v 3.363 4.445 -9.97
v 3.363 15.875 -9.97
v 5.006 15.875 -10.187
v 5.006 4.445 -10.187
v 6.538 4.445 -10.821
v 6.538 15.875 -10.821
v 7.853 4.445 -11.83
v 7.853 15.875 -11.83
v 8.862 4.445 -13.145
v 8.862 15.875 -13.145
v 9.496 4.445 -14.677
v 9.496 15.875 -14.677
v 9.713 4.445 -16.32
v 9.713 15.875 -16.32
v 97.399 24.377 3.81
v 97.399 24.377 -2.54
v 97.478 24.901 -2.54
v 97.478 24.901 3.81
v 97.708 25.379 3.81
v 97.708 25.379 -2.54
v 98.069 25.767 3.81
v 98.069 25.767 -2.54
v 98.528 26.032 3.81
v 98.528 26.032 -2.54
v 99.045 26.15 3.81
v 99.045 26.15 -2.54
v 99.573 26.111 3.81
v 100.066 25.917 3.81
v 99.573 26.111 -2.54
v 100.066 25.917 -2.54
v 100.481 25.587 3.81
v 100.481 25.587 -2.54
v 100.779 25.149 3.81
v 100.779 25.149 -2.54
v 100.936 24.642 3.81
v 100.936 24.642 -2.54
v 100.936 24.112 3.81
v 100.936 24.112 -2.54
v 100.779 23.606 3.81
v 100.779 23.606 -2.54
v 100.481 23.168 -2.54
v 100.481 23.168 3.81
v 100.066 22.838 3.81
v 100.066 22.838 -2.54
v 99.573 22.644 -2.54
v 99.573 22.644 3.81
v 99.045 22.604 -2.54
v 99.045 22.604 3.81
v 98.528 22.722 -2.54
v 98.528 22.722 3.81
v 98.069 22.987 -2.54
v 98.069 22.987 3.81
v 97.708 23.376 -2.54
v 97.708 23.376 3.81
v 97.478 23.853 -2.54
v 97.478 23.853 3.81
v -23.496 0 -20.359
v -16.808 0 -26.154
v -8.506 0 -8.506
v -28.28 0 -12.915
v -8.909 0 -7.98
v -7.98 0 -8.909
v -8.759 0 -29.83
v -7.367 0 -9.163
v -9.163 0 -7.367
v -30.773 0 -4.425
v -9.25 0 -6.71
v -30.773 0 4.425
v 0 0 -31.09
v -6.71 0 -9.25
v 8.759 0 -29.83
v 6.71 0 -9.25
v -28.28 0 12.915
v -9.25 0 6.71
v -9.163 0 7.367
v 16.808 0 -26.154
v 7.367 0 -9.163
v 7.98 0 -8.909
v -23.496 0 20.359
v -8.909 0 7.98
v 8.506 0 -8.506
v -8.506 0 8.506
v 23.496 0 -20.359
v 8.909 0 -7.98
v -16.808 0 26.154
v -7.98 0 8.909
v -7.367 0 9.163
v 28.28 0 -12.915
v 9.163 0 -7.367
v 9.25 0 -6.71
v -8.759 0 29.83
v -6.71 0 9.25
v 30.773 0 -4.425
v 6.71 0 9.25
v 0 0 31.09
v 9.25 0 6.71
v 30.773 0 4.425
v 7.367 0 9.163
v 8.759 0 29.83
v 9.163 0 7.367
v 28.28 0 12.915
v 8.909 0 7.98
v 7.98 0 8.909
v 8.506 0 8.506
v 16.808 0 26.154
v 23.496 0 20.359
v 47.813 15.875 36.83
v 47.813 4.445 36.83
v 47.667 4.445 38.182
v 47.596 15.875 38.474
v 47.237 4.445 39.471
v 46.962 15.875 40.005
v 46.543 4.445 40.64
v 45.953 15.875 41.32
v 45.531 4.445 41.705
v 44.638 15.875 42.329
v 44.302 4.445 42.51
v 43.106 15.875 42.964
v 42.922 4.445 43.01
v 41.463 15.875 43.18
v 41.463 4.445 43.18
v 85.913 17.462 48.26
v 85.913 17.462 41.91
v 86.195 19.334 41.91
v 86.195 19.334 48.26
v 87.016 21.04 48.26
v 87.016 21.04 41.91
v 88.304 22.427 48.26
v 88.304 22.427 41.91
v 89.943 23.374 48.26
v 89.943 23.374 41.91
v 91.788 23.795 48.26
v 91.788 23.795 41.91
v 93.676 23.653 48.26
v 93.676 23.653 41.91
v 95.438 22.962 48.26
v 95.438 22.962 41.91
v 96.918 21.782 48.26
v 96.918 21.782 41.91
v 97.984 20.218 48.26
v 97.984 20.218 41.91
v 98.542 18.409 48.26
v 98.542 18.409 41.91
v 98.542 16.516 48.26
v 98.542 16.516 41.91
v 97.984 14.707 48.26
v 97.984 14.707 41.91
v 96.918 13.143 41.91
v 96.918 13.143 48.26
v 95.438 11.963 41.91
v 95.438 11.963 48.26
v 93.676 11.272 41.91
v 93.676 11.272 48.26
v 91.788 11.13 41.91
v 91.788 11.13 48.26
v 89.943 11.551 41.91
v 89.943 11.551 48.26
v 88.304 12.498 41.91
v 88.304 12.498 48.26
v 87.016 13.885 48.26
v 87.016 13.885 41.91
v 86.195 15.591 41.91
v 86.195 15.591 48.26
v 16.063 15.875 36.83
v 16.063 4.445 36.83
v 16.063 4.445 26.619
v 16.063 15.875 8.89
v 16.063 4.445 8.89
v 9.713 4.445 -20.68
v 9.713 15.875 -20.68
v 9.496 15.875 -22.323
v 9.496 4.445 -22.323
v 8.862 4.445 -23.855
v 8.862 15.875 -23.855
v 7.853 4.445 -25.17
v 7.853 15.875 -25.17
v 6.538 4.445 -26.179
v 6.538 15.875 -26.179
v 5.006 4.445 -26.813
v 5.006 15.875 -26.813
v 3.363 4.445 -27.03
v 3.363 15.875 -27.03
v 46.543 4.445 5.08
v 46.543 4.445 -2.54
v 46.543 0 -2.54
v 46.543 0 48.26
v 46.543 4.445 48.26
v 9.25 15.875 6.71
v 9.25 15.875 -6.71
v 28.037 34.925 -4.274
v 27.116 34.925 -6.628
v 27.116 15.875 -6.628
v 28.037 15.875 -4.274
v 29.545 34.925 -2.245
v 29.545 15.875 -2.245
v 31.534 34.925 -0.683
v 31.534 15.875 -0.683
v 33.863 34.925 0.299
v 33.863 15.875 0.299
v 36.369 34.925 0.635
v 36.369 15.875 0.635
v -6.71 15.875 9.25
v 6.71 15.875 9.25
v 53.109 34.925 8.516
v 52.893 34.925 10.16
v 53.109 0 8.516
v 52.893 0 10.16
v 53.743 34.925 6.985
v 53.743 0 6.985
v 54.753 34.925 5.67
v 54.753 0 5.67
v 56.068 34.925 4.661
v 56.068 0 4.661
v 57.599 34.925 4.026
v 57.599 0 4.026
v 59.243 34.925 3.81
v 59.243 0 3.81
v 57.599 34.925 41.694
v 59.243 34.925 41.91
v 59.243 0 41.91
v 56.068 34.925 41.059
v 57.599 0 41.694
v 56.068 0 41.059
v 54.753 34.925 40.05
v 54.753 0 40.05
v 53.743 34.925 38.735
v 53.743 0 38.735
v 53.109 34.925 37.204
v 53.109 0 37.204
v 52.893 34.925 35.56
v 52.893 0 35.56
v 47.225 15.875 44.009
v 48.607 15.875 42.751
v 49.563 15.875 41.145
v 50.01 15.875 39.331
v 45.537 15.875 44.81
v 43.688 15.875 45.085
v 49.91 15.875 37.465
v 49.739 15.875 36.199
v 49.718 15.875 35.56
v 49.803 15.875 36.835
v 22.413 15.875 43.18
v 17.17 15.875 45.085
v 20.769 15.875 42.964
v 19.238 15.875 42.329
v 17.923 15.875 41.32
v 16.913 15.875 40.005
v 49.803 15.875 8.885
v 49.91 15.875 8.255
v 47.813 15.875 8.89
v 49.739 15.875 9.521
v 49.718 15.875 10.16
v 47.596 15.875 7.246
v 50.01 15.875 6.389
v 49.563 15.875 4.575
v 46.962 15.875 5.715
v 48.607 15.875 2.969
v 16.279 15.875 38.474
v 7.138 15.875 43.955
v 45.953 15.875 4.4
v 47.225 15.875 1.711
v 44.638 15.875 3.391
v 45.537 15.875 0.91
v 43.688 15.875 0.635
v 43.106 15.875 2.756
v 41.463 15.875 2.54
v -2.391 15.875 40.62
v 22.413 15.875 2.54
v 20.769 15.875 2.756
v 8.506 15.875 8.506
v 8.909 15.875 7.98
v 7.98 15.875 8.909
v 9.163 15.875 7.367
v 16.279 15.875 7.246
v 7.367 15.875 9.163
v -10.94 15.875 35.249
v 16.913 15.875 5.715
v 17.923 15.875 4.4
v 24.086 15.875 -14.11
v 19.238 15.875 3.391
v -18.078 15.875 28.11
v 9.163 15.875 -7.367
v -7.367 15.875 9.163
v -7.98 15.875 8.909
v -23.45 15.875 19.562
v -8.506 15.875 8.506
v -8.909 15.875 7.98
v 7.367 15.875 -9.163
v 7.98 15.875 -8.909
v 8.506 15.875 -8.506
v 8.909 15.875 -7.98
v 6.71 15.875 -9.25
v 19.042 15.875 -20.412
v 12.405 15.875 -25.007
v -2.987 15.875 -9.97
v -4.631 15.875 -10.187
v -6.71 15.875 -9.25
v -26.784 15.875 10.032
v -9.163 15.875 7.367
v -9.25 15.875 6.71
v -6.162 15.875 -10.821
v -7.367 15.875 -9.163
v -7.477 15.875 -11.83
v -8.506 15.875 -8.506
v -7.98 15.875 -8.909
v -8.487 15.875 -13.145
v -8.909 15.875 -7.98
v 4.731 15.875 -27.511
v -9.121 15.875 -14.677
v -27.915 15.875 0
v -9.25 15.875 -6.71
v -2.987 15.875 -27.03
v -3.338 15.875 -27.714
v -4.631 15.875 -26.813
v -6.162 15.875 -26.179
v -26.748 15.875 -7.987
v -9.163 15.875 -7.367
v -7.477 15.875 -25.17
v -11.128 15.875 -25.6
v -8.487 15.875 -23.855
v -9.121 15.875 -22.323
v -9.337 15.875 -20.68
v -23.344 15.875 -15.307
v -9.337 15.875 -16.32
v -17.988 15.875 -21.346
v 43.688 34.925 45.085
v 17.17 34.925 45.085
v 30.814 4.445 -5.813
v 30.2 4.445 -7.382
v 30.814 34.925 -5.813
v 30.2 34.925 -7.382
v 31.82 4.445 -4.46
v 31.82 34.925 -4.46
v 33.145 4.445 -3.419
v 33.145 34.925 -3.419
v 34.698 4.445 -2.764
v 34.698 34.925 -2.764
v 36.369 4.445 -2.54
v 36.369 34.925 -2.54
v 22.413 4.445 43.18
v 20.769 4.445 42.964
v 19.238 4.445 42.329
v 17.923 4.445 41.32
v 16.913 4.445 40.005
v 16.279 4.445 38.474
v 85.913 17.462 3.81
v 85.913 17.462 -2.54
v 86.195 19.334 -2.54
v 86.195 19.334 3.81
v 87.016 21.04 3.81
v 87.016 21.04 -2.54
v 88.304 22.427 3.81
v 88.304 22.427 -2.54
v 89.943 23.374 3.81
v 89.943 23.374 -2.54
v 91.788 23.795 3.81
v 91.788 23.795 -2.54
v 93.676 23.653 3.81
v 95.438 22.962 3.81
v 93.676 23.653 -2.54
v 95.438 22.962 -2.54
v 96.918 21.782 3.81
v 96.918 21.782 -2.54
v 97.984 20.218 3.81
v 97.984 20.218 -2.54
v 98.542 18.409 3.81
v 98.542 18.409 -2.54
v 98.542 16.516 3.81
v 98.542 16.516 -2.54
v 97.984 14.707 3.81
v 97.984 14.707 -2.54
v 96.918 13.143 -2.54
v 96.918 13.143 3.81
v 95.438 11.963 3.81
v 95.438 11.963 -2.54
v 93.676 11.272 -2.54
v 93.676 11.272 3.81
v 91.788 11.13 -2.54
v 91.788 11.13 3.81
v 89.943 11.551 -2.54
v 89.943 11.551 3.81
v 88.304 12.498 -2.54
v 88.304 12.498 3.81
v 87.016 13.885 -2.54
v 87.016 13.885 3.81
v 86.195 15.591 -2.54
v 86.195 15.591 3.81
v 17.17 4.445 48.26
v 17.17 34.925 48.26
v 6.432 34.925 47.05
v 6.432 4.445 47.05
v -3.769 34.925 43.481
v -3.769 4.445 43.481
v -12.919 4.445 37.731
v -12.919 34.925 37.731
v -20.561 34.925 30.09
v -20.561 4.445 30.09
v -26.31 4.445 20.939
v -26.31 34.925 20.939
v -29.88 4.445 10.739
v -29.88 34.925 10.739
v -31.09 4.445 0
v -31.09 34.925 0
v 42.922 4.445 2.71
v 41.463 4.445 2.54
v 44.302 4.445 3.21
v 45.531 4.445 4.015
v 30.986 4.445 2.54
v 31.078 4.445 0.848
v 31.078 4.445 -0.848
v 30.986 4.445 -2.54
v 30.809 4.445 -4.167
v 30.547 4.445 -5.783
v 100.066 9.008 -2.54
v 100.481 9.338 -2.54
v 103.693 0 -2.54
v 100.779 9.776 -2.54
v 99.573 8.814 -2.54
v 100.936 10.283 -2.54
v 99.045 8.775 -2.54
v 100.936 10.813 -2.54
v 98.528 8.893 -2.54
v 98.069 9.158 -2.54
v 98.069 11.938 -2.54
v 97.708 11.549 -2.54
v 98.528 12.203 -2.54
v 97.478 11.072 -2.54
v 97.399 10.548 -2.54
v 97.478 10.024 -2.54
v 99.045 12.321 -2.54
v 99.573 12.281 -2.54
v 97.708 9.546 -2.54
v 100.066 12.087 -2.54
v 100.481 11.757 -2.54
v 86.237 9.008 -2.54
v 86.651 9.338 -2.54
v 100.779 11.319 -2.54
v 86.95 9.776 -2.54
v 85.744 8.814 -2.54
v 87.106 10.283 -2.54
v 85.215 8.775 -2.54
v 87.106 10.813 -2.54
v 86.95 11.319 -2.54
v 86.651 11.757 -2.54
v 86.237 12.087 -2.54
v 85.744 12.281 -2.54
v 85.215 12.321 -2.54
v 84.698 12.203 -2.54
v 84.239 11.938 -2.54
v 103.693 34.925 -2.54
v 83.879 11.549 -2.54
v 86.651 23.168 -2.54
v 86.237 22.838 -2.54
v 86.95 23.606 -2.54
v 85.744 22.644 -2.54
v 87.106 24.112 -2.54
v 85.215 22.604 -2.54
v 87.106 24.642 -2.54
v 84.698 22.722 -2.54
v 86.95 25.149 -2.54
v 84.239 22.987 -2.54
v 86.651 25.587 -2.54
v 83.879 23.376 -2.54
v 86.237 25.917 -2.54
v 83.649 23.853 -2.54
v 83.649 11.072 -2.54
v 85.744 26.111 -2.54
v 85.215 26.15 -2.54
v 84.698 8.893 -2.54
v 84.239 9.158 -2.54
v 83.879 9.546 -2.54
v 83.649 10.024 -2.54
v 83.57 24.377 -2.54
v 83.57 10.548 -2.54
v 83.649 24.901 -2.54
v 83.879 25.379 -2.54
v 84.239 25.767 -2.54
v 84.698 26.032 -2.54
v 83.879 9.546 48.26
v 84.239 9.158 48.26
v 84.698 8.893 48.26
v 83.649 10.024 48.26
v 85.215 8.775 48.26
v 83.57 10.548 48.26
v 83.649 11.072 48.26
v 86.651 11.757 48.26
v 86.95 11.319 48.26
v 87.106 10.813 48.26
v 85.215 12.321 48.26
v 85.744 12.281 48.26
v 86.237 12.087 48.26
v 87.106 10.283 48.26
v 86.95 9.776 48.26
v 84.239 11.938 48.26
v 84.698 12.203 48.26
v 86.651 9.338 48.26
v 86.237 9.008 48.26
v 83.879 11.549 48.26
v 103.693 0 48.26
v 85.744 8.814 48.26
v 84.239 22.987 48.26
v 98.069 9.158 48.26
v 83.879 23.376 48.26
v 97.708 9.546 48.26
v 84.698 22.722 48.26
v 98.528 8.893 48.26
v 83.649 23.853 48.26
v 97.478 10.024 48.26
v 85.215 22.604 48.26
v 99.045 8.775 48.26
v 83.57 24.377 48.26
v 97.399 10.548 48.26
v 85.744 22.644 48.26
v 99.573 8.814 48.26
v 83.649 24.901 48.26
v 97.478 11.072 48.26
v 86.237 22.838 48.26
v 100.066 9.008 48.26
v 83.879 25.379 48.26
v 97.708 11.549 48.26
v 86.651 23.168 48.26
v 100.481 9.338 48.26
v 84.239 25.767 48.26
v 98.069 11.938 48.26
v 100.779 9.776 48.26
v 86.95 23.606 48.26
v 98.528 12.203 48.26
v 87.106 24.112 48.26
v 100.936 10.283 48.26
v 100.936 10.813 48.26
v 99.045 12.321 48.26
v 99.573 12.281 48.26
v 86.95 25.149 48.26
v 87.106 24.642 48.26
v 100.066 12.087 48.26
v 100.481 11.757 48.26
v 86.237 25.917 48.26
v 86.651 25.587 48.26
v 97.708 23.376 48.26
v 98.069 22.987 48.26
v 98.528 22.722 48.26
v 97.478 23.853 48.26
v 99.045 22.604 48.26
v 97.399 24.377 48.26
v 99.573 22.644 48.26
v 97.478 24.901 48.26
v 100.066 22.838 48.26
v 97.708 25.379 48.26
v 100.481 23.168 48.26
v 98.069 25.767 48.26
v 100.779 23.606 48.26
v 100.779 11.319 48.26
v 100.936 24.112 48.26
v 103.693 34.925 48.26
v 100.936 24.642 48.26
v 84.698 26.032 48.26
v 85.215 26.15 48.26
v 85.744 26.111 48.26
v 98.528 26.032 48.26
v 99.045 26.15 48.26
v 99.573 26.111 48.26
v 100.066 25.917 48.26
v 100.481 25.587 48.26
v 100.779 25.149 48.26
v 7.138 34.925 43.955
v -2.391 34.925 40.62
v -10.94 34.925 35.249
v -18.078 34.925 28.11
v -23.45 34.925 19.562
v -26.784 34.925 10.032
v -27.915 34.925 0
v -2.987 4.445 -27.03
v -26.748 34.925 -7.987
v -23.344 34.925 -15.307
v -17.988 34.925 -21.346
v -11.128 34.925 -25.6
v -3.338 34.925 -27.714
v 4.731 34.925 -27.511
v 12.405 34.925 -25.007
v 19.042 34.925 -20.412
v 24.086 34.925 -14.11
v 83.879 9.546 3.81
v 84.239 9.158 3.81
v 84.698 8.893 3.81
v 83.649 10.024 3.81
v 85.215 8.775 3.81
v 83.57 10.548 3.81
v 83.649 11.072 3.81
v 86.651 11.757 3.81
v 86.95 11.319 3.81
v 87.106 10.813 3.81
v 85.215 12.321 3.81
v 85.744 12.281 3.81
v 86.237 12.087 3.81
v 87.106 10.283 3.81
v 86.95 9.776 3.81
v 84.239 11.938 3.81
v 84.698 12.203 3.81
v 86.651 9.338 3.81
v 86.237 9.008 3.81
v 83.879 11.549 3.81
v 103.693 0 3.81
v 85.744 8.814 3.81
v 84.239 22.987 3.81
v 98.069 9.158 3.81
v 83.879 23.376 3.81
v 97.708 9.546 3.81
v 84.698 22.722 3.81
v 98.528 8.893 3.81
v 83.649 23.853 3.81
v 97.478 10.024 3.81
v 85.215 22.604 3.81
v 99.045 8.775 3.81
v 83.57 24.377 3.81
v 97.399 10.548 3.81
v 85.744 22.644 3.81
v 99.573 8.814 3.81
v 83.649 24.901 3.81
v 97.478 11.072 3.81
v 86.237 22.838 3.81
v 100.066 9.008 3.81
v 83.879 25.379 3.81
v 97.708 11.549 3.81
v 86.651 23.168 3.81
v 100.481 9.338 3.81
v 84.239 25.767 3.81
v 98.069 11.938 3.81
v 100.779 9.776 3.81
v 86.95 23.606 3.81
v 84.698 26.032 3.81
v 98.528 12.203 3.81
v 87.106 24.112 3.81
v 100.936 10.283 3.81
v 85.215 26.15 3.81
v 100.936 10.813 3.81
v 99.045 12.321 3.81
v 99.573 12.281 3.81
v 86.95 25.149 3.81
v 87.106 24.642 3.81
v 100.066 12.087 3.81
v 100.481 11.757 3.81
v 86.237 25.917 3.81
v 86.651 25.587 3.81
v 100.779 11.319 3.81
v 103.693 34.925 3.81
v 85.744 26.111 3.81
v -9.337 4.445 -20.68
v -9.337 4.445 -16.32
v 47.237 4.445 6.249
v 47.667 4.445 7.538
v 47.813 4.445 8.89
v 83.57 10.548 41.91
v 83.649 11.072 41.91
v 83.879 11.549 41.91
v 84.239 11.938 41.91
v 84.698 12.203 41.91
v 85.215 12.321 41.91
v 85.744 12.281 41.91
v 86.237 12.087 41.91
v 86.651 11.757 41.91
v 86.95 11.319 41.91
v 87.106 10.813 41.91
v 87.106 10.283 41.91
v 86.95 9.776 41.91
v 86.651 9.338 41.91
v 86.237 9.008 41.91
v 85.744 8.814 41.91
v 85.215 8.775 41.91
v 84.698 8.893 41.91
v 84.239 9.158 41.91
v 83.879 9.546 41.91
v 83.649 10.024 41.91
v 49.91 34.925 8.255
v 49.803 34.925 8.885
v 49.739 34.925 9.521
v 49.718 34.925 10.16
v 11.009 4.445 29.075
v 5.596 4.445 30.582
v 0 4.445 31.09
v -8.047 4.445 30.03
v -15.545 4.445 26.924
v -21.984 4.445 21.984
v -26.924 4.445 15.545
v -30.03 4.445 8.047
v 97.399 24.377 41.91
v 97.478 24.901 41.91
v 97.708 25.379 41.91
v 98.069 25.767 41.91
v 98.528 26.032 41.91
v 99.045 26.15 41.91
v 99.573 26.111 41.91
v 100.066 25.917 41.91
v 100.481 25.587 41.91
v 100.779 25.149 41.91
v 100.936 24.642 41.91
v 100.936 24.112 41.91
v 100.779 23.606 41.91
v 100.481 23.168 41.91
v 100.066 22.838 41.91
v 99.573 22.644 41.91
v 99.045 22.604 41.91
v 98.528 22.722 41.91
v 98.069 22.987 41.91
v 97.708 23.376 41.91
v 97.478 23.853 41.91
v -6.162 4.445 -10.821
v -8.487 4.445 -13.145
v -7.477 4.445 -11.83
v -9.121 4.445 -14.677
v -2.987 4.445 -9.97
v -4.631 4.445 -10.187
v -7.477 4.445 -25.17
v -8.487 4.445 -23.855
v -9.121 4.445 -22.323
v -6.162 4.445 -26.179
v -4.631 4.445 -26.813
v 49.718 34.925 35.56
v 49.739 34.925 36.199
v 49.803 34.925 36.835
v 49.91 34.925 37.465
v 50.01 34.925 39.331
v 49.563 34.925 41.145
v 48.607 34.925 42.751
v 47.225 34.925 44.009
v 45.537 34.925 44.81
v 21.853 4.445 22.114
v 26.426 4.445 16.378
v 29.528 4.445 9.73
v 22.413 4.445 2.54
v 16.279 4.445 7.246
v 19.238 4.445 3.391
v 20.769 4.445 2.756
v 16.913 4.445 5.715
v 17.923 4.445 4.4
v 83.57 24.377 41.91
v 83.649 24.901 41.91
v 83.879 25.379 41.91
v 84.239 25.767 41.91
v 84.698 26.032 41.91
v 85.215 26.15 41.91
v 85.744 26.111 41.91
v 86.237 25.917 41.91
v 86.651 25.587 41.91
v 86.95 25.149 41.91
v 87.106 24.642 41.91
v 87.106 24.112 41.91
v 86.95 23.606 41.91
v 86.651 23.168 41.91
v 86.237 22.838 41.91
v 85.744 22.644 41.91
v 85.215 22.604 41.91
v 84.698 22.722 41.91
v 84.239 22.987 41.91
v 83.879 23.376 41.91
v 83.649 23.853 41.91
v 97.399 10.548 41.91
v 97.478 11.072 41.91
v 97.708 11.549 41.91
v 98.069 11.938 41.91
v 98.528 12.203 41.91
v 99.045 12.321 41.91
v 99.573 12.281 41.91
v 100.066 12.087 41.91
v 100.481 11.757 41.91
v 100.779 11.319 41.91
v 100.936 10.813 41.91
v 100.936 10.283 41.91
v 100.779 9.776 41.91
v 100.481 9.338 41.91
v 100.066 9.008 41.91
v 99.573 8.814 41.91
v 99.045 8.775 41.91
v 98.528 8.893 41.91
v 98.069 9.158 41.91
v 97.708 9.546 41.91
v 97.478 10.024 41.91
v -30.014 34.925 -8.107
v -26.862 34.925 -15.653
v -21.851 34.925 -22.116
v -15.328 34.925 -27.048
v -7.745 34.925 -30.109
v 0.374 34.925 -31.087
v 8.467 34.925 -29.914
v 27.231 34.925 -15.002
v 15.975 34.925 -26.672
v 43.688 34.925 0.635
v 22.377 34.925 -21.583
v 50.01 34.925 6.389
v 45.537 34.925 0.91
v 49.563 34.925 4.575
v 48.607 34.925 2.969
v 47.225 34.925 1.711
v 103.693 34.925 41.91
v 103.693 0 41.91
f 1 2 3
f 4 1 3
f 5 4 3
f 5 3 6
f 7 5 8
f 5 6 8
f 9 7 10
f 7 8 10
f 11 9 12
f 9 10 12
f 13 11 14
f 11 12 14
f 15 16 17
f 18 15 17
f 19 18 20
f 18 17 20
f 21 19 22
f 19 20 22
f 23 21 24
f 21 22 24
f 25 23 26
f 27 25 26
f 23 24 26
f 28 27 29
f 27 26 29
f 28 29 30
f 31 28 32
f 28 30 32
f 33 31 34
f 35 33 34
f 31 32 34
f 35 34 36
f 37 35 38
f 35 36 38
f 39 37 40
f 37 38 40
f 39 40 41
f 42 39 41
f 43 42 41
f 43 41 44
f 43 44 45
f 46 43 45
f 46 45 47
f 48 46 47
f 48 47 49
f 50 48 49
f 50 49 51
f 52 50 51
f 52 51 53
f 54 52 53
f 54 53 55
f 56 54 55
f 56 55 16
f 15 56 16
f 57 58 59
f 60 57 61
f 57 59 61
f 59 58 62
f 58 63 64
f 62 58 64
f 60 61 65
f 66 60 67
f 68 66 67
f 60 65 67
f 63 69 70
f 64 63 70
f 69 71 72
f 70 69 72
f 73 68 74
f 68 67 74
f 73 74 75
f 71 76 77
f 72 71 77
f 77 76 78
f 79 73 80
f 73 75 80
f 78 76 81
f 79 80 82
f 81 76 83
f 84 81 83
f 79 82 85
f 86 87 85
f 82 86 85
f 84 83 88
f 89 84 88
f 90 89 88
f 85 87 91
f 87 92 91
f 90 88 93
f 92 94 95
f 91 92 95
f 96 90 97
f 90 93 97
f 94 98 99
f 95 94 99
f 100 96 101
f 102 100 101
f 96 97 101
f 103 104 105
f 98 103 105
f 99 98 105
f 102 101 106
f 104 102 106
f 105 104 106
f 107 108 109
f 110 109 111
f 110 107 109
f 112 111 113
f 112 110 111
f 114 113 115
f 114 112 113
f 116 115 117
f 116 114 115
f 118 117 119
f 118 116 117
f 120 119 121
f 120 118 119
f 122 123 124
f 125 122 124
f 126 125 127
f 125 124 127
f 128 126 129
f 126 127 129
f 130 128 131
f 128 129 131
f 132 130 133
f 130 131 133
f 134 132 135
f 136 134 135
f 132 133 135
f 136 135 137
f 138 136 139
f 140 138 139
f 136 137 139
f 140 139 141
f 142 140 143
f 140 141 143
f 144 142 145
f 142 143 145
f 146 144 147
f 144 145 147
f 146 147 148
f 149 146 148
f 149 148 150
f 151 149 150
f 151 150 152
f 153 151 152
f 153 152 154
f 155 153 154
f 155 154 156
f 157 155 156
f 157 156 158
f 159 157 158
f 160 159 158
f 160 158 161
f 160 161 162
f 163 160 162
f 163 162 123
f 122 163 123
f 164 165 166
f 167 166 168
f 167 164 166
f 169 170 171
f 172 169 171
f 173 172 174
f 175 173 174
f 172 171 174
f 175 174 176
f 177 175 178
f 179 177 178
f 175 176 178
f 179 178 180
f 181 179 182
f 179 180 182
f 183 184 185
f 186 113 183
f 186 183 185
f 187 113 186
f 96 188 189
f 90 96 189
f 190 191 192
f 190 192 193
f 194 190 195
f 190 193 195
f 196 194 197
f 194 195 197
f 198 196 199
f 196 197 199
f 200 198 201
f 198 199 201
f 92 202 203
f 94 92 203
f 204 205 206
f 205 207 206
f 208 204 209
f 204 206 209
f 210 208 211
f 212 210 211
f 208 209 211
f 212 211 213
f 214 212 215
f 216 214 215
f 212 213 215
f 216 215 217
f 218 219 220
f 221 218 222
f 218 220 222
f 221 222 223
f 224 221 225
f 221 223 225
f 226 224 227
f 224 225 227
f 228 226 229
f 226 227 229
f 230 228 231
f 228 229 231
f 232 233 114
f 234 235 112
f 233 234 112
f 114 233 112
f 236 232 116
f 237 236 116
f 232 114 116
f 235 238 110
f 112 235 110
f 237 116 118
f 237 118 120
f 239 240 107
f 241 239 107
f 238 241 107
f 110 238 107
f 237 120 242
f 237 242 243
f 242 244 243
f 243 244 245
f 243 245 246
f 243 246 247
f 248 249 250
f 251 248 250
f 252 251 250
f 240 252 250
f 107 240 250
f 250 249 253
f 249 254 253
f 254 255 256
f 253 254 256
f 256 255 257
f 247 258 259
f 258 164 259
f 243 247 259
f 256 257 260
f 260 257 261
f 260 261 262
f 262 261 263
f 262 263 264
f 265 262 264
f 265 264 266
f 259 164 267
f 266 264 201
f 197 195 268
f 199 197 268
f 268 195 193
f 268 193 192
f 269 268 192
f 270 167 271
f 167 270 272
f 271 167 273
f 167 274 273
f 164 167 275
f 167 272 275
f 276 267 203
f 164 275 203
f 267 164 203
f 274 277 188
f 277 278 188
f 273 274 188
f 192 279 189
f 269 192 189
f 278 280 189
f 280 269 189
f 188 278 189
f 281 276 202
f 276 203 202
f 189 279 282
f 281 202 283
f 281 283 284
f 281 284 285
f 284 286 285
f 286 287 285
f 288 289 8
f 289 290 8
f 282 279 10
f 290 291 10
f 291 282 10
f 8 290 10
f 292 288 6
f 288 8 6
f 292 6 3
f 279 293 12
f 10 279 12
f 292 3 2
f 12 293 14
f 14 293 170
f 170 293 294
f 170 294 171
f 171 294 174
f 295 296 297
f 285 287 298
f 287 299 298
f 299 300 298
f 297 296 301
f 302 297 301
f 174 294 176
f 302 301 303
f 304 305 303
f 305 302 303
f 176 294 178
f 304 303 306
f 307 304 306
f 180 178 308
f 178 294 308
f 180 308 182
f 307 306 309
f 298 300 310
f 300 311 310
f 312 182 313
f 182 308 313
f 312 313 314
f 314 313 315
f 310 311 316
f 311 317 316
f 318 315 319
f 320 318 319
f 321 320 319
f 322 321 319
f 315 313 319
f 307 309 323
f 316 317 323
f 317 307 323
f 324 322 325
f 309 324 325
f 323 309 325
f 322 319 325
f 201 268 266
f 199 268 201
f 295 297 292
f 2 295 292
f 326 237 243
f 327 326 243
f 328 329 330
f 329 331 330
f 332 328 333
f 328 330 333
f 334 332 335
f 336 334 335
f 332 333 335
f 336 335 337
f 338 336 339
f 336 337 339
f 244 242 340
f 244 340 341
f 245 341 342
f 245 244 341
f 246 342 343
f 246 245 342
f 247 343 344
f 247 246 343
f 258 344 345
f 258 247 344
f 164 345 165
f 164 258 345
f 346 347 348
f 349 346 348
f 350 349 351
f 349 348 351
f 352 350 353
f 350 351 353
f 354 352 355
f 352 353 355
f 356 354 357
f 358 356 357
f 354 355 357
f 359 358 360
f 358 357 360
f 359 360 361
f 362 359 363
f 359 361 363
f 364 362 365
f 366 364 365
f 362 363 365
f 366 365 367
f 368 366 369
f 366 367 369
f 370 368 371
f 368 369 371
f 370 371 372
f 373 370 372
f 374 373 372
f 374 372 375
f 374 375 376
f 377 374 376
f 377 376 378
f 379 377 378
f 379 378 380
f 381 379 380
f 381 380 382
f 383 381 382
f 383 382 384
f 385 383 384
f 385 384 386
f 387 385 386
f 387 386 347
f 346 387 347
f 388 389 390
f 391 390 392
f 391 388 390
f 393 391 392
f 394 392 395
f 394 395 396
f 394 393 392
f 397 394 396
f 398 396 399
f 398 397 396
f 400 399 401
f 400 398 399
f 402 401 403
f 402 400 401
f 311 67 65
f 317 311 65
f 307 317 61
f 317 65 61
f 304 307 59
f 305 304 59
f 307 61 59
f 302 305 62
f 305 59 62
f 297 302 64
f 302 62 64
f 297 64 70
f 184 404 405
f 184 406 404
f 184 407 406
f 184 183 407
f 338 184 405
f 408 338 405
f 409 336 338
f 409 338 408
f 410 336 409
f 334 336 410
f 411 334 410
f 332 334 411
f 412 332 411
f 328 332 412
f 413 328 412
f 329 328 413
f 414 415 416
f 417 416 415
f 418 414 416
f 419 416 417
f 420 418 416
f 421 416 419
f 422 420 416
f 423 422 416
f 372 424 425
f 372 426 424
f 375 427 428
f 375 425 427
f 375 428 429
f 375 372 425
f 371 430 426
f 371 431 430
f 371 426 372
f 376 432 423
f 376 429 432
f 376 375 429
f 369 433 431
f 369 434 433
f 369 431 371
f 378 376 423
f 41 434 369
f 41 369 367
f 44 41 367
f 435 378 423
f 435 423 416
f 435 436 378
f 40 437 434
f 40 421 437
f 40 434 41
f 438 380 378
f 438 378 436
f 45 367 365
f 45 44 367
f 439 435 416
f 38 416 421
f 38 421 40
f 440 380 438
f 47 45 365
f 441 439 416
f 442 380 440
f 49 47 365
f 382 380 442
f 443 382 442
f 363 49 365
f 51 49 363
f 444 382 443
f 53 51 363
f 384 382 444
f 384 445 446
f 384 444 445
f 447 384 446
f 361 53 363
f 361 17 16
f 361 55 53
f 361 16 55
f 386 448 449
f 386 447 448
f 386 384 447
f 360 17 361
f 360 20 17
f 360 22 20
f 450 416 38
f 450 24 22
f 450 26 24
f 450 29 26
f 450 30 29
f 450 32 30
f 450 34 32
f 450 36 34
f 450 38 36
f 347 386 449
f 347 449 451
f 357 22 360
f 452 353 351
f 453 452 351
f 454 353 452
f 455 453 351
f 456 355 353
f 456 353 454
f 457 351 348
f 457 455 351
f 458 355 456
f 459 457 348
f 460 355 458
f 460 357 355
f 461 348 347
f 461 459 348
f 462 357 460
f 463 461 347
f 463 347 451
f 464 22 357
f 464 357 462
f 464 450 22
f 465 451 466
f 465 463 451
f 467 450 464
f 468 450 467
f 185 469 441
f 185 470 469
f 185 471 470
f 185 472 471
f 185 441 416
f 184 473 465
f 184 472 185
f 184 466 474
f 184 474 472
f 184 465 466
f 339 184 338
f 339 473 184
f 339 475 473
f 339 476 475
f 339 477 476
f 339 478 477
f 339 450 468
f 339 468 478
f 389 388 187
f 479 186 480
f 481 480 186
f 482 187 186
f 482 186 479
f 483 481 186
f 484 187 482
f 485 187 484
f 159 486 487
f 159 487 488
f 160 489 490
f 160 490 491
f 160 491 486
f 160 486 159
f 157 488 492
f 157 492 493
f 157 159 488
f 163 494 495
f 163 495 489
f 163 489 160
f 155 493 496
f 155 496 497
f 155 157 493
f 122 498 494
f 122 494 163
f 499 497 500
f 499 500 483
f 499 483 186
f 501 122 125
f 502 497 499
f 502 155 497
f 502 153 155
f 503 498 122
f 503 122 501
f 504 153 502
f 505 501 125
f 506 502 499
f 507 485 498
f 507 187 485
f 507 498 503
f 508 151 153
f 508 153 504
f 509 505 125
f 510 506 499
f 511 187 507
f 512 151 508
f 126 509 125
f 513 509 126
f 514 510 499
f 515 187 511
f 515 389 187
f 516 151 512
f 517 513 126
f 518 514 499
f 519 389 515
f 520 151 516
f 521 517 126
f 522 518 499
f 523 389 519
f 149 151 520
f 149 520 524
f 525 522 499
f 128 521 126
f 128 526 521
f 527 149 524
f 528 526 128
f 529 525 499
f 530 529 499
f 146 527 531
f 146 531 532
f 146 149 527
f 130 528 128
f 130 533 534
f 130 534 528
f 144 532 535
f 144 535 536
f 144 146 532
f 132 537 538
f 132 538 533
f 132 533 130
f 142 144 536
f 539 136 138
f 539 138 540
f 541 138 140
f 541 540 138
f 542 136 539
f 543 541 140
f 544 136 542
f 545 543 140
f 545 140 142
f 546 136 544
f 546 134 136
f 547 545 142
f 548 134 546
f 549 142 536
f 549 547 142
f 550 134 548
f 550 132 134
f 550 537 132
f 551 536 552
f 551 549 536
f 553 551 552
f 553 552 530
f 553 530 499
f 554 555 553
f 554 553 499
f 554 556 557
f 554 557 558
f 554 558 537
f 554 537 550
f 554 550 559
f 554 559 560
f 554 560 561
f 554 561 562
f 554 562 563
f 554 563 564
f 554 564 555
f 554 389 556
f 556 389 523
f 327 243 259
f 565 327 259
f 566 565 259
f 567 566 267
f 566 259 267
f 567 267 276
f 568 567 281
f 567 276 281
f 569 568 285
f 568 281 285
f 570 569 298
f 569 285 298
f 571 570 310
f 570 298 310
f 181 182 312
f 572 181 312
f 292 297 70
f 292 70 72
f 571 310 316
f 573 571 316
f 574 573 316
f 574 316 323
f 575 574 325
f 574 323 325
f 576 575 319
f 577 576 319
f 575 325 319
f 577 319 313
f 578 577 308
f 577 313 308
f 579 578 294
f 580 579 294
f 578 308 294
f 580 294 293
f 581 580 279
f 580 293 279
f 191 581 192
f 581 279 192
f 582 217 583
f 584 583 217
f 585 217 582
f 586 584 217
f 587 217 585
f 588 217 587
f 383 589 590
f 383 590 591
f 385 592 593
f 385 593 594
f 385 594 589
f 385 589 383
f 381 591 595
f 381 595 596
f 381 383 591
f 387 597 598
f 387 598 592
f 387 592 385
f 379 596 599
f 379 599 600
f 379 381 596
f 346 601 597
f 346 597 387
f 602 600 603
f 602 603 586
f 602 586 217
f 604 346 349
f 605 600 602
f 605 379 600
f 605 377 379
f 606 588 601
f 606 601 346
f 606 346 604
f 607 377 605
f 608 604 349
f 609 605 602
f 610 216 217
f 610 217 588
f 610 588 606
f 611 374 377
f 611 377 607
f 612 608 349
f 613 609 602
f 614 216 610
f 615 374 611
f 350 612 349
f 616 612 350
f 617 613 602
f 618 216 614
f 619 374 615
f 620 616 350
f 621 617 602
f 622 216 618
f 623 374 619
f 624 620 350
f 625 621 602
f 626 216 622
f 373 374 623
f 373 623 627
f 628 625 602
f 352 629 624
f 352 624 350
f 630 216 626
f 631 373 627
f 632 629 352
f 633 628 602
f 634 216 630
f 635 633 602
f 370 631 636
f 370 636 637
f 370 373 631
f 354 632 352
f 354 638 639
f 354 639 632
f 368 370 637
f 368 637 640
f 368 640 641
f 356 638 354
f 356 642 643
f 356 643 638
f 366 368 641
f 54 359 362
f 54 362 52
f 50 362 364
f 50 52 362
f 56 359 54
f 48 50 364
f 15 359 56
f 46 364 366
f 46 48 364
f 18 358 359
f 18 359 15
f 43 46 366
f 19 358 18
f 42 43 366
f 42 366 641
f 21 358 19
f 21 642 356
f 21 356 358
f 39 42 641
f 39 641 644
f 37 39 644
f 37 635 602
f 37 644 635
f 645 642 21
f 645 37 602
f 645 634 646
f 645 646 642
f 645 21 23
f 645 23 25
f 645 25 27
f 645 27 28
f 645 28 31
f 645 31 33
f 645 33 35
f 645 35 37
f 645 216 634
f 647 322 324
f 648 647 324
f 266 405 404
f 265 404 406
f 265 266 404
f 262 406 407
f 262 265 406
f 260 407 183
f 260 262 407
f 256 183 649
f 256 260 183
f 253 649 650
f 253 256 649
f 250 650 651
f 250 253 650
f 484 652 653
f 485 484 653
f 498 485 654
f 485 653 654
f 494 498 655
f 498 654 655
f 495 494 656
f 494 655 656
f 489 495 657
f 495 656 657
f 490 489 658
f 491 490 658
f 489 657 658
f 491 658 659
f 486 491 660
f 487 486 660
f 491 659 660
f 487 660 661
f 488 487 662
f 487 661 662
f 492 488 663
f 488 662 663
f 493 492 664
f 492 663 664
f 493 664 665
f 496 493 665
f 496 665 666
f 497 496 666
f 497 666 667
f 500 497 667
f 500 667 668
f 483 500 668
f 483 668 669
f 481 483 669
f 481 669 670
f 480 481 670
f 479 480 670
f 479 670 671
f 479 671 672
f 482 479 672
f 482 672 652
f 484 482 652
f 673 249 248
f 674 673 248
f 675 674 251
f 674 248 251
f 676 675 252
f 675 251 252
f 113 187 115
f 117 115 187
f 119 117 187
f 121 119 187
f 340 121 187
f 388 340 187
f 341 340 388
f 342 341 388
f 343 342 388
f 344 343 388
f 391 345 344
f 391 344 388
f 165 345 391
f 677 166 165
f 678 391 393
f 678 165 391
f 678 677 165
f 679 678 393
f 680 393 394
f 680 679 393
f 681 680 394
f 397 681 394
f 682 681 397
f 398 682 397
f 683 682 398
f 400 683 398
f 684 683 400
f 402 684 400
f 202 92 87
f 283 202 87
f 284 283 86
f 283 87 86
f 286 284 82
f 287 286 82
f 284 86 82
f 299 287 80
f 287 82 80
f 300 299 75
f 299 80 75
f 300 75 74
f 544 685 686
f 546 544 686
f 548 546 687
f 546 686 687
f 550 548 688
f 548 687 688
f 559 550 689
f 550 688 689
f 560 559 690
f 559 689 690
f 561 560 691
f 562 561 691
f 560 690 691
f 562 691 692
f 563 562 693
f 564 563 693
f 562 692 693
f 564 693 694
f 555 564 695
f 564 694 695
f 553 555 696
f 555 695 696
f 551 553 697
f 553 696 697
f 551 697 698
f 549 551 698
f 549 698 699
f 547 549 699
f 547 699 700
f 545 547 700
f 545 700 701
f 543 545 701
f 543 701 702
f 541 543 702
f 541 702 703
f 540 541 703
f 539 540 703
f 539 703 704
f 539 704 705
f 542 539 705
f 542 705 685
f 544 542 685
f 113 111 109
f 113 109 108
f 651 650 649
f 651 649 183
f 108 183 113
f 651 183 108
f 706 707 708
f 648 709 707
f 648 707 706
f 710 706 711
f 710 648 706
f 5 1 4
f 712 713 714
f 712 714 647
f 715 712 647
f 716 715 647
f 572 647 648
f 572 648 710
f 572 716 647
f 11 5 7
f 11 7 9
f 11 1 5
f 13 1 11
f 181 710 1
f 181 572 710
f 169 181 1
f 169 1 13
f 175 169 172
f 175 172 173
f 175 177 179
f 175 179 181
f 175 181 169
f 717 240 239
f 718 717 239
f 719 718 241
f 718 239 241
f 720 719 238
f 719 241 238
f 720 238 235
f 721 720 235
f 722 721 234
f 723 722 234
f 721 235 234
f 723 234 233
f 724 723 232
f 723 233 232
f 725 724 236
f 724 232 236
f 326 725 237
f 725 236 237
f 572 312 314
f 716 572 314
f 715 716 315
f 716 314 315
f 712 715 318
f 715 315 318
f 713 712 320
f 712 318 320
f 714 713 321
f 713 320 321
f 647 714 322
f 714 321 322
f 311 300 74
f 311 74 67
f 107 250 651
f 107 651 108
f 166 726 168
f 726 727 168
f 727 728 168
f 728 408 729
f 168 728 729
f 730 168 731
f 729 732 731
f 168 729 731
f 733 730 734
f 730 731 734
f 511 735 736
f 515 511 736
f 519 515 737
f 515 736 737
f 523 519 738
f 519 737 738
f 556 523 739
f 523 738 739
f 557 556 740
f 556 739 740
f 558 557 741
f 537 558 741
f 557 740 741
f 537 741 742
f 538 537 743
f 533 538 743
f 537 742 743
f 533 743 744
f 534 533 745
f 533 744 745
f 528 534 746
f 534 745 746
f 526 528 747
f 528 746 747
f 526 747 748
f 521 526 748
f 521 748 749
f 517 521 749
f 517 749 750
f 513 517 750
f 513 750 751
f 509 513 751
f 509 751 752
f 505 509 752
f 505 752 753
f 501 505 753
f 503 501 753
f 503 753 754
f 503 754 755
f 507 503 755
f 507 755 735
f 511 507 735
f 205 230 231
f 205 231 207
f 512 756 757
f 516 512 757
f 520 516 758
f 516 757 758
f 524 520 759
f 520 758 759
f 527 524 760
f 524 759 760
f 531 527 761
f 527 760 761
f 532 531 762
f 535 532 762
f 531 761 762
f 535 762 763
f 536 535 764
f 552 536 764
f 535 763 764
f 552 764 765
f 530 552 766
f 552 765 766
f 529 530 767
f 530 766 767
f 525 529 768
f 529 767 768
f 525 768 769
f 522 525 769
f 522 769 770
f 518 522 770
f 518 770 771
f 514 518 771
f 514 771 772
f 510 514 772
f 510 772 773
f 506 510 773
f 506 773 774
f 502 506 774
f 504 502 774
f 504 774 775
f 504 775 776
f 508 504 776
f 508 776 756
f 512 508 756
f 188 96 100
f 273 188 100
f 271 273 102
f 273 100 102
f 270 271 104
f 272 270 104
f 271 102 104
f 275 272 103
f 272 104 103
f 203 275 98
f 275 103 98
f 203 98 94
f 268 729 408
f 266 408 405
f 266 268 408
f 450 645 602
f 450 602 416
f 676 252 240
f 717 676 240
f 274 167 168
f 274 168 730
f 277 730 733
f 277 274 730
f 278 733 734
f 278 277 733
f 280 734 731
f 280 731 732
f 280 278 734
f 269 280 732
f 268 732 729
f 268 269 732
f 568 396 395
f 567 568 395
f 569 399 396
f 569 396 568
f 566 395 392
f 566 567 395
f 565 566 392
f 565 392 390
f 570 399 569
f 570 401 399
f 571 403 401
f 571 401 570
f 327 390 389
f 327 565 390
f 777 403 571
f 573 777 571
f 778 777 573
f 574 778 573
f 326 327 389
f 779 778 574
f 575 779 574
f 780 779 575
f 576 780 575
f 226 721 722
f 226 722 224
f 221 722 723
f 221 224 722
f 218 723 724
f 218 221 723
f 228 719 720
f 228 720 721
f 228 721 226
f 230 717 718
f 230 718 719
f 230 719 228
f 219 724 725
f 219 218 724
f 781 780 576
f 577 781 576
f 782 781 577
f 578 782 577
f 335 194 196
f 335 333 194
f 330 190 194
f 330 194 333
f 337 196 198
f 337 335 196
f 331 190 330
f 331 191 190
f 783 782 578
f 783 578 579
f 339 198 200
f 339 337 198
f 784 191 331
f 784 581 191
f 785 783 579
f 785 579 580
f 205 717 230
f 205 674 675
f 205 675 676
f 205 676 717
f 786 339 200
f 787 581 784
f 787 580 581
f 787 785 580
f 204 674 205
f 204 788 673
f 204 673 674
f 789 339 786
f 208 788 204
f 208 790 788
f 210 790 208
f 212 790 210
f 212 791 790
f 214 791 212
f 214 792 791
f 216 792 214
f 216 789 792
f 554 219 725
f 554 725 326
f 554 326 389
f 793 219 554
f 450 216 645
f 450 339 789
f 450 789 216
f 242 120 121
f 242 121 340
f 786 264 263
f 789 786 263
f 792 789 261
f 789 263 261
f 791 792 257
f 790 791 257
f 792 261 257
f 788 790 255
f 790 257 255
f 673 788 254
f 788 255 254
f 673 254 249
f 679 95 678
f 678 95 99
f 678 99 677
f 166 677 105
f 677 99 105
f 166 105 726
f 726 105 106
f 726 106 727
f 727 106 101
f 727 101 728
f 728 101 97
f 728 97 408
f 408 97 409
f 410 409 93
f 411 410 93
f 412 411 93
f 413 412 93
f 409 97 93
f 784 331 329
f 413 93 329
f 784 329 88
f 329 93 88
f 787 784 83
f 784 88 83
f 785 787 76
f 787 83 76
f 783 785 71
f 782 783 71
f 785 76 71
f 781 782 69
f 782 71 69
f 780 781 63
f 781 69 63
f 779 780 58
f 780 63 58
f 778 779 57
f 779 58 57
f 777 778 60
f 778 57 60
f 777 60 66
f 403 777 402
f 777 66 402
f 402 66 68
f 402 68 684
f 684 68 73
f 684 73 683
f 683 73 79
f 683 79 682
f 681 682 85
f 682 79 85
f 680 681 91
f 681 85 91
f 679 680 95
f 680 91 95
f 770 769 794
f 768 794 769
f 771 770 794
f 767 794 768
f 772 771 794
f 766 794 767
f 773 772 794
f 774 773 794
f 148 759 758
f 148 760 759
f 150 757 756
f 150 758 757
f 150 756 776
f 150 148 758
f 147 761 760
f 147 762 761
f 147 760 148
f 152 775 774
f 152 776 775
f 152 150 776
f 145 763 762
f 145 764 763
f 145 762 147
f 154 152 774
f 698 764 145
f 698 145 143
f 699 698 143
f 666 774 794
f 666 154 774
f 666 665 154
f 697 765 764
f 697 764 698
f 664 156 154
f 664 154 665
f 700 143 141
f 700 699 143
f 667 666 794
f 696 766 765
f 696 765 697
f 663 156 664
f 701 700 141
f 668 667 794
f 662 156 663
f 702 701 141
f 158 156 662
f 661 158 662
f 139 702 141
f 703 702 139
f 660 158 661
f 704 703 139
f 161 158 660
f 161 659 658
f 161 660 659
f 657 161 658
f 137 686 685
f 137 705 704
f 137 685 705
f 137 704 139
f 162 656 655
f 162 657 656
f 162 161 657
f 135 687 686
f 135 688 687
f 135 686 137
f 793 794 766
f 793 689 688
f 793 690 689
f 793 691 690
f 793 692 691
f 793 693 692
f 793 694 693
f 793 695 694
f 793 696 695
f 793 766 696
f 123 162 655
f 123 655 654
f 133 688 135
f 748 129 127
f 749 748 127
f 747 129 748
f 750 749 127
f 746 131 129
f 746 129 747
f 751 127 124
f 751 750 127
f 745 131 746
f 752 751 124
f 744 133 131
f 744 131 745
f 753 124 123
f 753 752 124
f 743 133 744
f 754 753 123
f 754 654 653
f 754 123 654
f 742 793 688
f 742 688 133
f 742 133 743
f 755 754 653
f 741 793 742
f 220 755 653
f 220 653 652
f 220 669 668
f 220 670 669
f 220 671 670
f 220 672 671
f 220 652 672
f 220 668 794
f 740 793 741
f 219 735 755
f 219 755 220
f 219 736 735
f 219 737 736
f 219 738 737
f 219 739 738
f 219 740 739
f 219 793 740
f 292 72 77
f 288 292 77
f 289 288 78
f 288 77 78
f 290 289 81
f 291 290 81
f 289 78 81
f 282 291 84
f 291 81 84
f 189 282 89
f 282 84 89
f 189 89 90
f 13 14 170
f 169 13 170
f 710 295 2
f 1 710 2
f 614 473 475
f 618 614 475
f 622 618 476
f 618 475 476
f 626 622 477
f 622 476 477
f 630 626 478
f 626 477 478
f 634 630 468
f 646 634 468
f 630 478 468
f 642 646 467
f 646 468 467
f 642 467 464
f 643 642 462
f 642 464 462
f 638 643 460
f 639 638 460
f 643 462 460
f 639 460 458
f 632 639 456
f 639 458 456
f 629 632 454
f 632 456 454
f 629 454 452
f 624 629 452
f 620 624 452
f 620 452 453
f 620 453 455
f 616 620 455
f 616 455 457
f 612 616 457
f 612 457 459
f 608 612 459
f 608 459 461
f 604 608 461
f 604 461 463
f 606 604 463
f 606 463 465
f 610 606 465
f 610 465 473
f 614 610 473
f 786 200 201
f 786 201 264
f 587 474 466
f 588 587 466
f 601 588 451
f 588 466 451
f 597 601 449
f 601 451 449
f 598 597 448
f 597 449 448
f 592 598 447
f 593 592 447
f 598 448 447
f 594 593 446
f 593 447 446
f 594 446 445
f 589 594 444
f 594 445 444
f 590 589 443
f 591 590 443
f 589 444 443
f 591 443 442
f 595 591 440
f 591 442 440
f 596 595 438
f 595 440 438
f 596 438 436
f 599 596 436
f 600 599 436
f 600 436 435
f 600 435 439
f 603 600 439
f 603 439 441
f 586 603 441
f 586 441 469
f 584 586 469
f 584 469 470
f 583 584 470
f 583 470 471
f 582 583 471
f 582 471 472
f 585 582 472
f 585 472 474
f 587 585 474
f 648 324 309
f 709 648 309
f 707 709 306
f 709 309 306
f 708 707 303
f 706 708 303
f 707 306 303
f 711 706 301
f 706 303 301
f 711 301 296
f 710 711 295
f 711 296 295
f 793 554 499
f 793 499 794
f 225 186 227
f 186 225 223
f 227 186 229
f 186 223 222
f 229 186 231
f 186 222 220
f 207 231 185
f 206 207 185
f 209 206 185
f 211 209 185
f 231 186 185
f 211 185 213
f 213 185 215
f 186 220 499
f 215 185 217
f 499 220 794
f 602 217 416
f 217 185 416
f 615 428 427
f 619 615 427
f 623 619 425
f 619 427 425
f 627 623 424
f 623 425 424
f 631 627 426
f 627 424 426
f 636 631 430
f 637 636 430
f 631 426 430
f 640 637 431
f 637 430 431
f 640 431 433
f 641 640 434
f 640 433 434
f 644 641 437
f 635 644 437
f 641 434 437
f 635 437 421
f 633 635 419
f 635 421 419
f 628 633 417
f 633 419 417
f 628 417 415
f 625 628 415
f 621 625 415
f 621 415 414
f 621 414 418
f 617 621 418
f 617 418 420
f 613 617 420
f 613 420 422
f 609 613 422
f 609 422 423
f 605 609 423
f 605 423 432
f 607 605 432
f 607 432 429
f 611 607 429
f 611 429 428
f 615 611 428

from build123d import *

# Parameters (mm, degrees)
SKETCH1_R           = 31.0896
BOSS_EXTRUDE1_DEPTH = 34.925
BOSS_EXTRUDE2_START = -30.48
BOSS_EXTRUDE2_DEPTH = 30.48
BOSS_EXTRUDE3_DEPTH = 34.925
CUT_EXTRUDE1_REACH  = 122.634
SKETCH4_R           = 6.35
SKETCH4_R_2         = 1.778
SKETCH5_W           = 18.49932761
SKETCH5_H           = 18.49932761
CUT_EXTRUDE2_DEPTH  = 34.925
FILLET3_R           = 2.54
FILLET4_R           = 2.54
FILLET5_R           = 2.54
FILLET6_R           = 2.54
FILLET8_R           = 6.35
FILLET9_R           = 6.35
FILLET10_R          = 6.35
CUT_EXTRUDE3_START  = -19.05
CUT_EXTRUDE3_DEPTH  = 19.05
CUT_EXTRUDE4_DEPTH  = 11.43
CUT_EXTRUDE5_DEPTH  = 11.43


with BuildPart() as part:
    # Sketch1 → Boss-Extrude1 (new body)
    with BuildSketch(Plane(origin=(0, 0, 0), x_dir=(1, 0, 0), z_dir=(0, 1, 0))):
        with Locations(Location((0, 0, 0), (0, 0, 270))):
            Circle(SKETCH1_R)
    extrude(amount=BOSS_EXTRUDE1_DEPTH)

    # Sketch2 → Boss-Extrude2 (add)
    with BuildSketch(Plane(origin=(0, 34.925, 0), x_dir=(1, 0, 0), z_dir=(0, 1, 0)).offset(BOSS_EXTRUDE2_START)):
        with BuildLine():
            Line((46.542690567, -48.26), (17.1704, -48.26))
            ThreePointArc((17.1704, -48.26), (-16.95457326, -34.12497326), (-31.0896, 0))
            ThreePointArc((-31.0896, 0), (1.271062728, -31.063606161), (30.985668109, 2.54))
            Line((30.985668109, 2.54), (46.542690567, 2.54))
            Line((46.542690567, 2.54), (46.542690567, -48.26))
        make_face()
    extrude(amount=BOSS_EXTRUDE2_DEPTH)

    # Sketch3 → Boss-Extrude3 (add)
    with BuildSketch(Plane(origin=(0, 34.925, 0), x_dir=(1, 0, 0), z_dir=(0, 1, 0))):
        Polygon((46.542690567, -0.333607673), (46.542690567, -48.26), (103.692690567, -48.26), (103.692690567, -41.91), (52.892690567, -41.91), (52.892690567, -3.81), (103.692690567, -3.81), (103.692690567, 2.54), (46.542690567, 2.54), align=None)
    extrude(amount=-BOSS_EXTRUDE3_DEPTH)

    # Cut-Extrude1: up to this face of the body (flat: up to its plane)
    cut_extrude1_end = Plane(part.part.faces().sort_by_distance((61.721911557, 18.150695346, 48.26))[0])
    # Sketch4 → Cut-Extrude1 (cut, up to the picked face)
    with BuildSketch(Plane(origin=(0, 0, -2.54), x_dir=(-1, 0, 0), z_dir=(0, 0, -1)), mode=Mode.PRIVATE) as cut_extrude1_sk1:
        with Locations((-92.262690567, 17.4625)):
            Circle(SKETCH4_R)
    cut_extrude1_tool1 = split(extrude(cut_extrude1_sk1.sketch, amount=-CUT_EXTRUDE1_REACH, mode=Mode.PRIVATE), bisect_by=cut_extrude1_end, keep=Keep.BOTH, mode=Mode.PRIVATE)
    # Sketch4 → Cut-Extrude1 (cut, up to the picked face)
    with BuildSketch(Plane(origin=(0, 0, -2.54), x_dir=(-1, 0, 0), z_dir=(0, 0, -1)), mode=Mode.PRIVATE) as cut_extrude1_sk2:
        with Locations((-85.347893353, 10.547702787)):
            Circle(SKETCH4_R_2)
    cut_extrude1_tool2 = split(extrude(cut_extrude1_sk2.sketch, amount=-CUT_EXTRUDE1_REACH, mode=Mode.PRIVATE), bisect_by=cut_extrude1_end, keep=Keep.BOTH, mode=Mode.PRIVATE)
    # Sketch4 → Cut-Extrude1 (cut, up to the picked face)
    with BuildSketch(Plane(origin=(0, 0, -2.54), x_dir=(-1, 0, 0), z_dir=(0, 0, -1)), mode=Mode.PRIVATE) as cut_extrude1_sk3:
        with Locations((-99.17748778, 24.377297213)):
            Circle(SKETCH4_R_2)
    cut_extrude1_tool3 = split(extrude(cut_extrude1_sk3.sketch, amount=-CUT_EXTRUDE1_REACH, mode=Mode.PRIVATE), bisect_by=cut_extrude1_end, keep=Keep.BOTH, mode=Mode.PRIVATE)
    # Sketch4 → Cut-Extrude1 (cut, up to the picked face)
    with BuildSketch(Plane(origin=(0, 0, -2.54), x_dir=(-1, 0, 0), z_dir=(0, 0, -1)), mode=Mode.PRIVATE) as cut_extrude1_sk4:
        with Locations((-99.17748778, 10.547702787)):
            Circle(SKETCH4_R_2)
    cut_extrude1_tool4 = split(extrude(cut_extrude1_sk4.sketch, amount=-CUT_EXTRUDE1_REACH, mode=Mode.PRIVATE), bisect_by=cut_extrude1_end, keep=Keep.BOTH, mode=Mode.PRIVATE)
    # Sketch4 → Cut-Extrude1 (cut, up to the picked face)
    with BuildSketch(Plane(origin=(0, 0, -2.54), x_dir=(-1, 0, 0), z_dir=(0, 0, -1)), mode=Mode.PRIVATE) as cut_extrude1_sk5:
        with Locations((-85.347893353, 24.377297213)):
            Circle(SKETCH4_R_2)
    cut_extrude1_tool5 = split(extrude(cut_extrude1_sk5.sketch, amount=-CUT_EXTRUDE1_REACH, mode=Mode.PRIVATE), bisect_by=cut_extrude1_end, keep=Keep.BOTH, mode=Mode.PRIVATE)
    add(cut_extrude1_tool1.solids().sort_by(Axis((92.262691, 17.4625, -2.54), (0, 0, 1)))[0], mode=Mode.SUBTRACT)
    add(cut_extrude1_tool2.solids().sort_by(Axis((85.347893, 10.547703, -2.54), (0, 0, 1)))[0], mode=Mode.SUBTRACT)
    add(cut_extrude1_tool3.solids().sort_by(Axis((99.177488, 24.377297, -2.54), (0, 0, 1)))[0], mode=Mode.SUBTRACT)
    add(cut_extrude1_tool4.solids().sort_by(Axis((99.177488, 10.547703, -2.54), (0, 0, 1)))[0], mode=Mode.SUBTRACT)
    add(cut_extrude1_tool5.solids().sort_by(Axis((85.347893, 24.377297, -2.54), (0, 0, 1)))[0], mode=Mode.SUBTRACT)

    # Sketch5 → Cut-Extrude2 (cut)
    with BuildSketch(Plane(origin=(0, 34.925, 0), x_dir=(1, 0, 0), z_dir=(0, 1, 0))):
        Rectangle(SKETCH5_W, SKETCH5_H)
    extrude(amount=-CUT_EXTRUDE2_DEPTH, mode=Mode.SUBTRACT)

    # Fillet3
    fillet3_edges = [part.edges().sort_by_distance(p)[0] for p in [
        (-9.249663805, 17.4625, 9.249663805),
    ]]
    fillet(fillet3_edges, radius=FILLET3_R)

    # Fillet4
    fillet4_edges = [part.edges().sort_by_distance(p)[0] for p in [
        (-9.249663805, 17.4625, -9.249663805),
    ]]
    fillet(fillet4_edges, radius=FILLET4_R)

    # Fillet5
    fillet5_edges = [part.edges().sort_by_distance(p)[0] for p in [
        (9.249663805, 17.4625, -9.249663805),
    ]]
    fillet(fillet5_edges, radius=FILLET5_R)

    # Fillet6
    fillet6_edges = [part.edges().sort_by_distance(p)[0] for p in [
        (9.249663805, 17.4625, 9.249663805),
    ]]
    fillet(fillet6_edges, radius=FILLET6_R)

    # Fillet8
    fillet8_edges = [part.edges().sort_by_distance(p)[0] for p in [
        (30.985668109, 19.685, -2.54),
    ]]
    fillet(fillet8_edges, radius=FILLET8_R)

    # Fillet9
    fillet9_edges = [part.edges().sort_by_distance(p)[0] for p in [
        (52.892690567, 17.4625, 41.91),
    ]]
    fillet(fillet9_edges, radius=FILLET9_R)

    # Fillet10
    fillet10_edges = [part.edges().sort_by_distance(p)[0] for p in [
        (52.892690567, 17.4625, 3.81),
    ]]
    fillet(fillet10_edges, radius=FILLET10_R)

    # Sketch6 → Cut-Extrude3 (cut)
    with BuildSketch(Plane(origin=(0, 34.925, 0), x_dir=(1, 0, 0), z_dir=(0, 1, 0)).offset(CUT_EXTRUDE3_START)):
        with BuildLine():
            ThreePointArc((49.910134647, -8.255), (49.765923709, -9.202652137), (49.717690567, -10.16))
            Line((49.717690567, -10.16), (49.717690567, -35.56))
            ThreePointArc((49.717690567, -35.56), (49.765923709, -36.517347863), (49.910134647, -37.465))
            ThreePointArc((49.910134647, -37.465), (48.60711955, -42.751092628), (43.6884307, -45.085))
            Line((43.6884307, -45.085), (17.1704, -45.085))
            ThreePointArc((17.1704, -45.085), (-14.70950923, -31.87990923), (-27.9146, 0))
            ThreePointArc((-27.9146, 0), (-3.338101965, 27.714291772), (27.116241813, 6.628297151))
            ThreePointArc((27.116241813, 6.628297151), (30.48737672, 1.397725825), (36.368826599, -0.635))
            Line((36.368826599, -0.635), (43.6884307, -0.635))
            ThreePointArc((43.6884307, -0.635), (48.60711955, -2.968907372), (49.910134647, -8.255))
        make_face()
        with BuildLine():
            ThreePointArc((6.709663805, 9.249663805), (8.505715029, 8.505715029), (9.249663805, 6.709663805))
            Line((9.249663805, 6.709663805), (9.249663805, -6.709663805))
            ThreePointArc((9.249663805, -6.709663805), (8.505715029, -8.505715029), (6.709663805, -9.249663805))
            Line((6.709663805, -9.249663805), (-6.709663805, -9.249663805))
            ThreePointArc((-6.709663805, -9.249663805), (-8.505715029, -8.505715029), (-9.249663805, -6.709663805))
            Line((-9.249663805, -6.709663805), (-9.249663805, 6.709663805))
            ThreePointArc((-9.249663805, 6.709663805), (-8.505715029, 8.505715029), (-6.709663805, 9.249663805))
            Line((-6.709663805, 9.249663805), (6.709663805, 9.249663805))
        make_face(mode=Mode.SUBTRACT)
    extrude(amount=CUT_EXTRUDE3_DEPTH, mode=Mode.SUBTRACT)

    # Sketch8 → Cut-Extrude4 (cut)
    with BuildSketch(Plane(origin=(0, 15.875, 0), x_dir=(1, 0, 0), z_dir=(0, 1, 0))):
        with BuildLine():
            Line((22.412690567, -2.54), (41.462690567, -2.54))
            ThreePointArc((41.462690567, -2.54), (45.952818627, -4.399871939), (47.812690567, -8.89))
            Line((47.812690567, -8.89), (47.812690567, -36.83))
            ThreePointArc((47.812690567, -36.83), (45.952818627, -41.320128061), (41.462690567, -43.18))
            Line((41.462690567, -43.18), (22.412690567, -43.18))
            ThreePointArc((22.412690567, -43.18), (17.922562506, -41.320128061), (16.062690567, -36.83))
            Line((16.062690567, -36.83), (16.062690567, -8.89))
            ThreePointArc((16.062690567, -8.89), (17.922562506, -4.399871939), (22.412690567, -2.54))
        make_face()
    extrude(amount=-CUT_EXTRUDE4_DEPTH, mode=Mode.SUBTRACT)

    # Sketch9 → Cut-Extrude5 (cut)
    with BuildSketch(Plane(origin=(0, 15.875, 0), x_dir=(1, 0, 0), z_dir=(0, 1, 0))):
        with BuildLine():
            Line((-9.337309433, 20.679663805), (-9.337309433, 16.320204994))
            ThreePointArc((-9.337309433, 16.320204994), (-7.477437494, 11.830076933), (-2.987309433, 9.970204994))
            Line((-2.987309433, 9.970204994), (3.362690567, 9.970204994))
            ThreePointArc((3.362690567, 9.970204994), (7.852818627, 11.830076933), (9.712690567, 16.320204994))
            Line((9.712690567, 16.320204994), (9.712690567, 20.679663805))
            ThreePointArc((9.712690567, 20.679663805), (7.852818627, 25.169791865), (3.362690567, 27.029663805))
            Line((3.362690567, 27.029663805), (-2.987309433, 27.029663805))
            ThreePointArc((-2.987309433, 27.029663805), (-7.477437494, 25.169791865), (-9.337309433, 20.679663805))
        make_face()
    extrude(amount=-CUT_EXTRUDE5_DEPTH, mode=Mode.SUBTRACT)


solid = part.part
